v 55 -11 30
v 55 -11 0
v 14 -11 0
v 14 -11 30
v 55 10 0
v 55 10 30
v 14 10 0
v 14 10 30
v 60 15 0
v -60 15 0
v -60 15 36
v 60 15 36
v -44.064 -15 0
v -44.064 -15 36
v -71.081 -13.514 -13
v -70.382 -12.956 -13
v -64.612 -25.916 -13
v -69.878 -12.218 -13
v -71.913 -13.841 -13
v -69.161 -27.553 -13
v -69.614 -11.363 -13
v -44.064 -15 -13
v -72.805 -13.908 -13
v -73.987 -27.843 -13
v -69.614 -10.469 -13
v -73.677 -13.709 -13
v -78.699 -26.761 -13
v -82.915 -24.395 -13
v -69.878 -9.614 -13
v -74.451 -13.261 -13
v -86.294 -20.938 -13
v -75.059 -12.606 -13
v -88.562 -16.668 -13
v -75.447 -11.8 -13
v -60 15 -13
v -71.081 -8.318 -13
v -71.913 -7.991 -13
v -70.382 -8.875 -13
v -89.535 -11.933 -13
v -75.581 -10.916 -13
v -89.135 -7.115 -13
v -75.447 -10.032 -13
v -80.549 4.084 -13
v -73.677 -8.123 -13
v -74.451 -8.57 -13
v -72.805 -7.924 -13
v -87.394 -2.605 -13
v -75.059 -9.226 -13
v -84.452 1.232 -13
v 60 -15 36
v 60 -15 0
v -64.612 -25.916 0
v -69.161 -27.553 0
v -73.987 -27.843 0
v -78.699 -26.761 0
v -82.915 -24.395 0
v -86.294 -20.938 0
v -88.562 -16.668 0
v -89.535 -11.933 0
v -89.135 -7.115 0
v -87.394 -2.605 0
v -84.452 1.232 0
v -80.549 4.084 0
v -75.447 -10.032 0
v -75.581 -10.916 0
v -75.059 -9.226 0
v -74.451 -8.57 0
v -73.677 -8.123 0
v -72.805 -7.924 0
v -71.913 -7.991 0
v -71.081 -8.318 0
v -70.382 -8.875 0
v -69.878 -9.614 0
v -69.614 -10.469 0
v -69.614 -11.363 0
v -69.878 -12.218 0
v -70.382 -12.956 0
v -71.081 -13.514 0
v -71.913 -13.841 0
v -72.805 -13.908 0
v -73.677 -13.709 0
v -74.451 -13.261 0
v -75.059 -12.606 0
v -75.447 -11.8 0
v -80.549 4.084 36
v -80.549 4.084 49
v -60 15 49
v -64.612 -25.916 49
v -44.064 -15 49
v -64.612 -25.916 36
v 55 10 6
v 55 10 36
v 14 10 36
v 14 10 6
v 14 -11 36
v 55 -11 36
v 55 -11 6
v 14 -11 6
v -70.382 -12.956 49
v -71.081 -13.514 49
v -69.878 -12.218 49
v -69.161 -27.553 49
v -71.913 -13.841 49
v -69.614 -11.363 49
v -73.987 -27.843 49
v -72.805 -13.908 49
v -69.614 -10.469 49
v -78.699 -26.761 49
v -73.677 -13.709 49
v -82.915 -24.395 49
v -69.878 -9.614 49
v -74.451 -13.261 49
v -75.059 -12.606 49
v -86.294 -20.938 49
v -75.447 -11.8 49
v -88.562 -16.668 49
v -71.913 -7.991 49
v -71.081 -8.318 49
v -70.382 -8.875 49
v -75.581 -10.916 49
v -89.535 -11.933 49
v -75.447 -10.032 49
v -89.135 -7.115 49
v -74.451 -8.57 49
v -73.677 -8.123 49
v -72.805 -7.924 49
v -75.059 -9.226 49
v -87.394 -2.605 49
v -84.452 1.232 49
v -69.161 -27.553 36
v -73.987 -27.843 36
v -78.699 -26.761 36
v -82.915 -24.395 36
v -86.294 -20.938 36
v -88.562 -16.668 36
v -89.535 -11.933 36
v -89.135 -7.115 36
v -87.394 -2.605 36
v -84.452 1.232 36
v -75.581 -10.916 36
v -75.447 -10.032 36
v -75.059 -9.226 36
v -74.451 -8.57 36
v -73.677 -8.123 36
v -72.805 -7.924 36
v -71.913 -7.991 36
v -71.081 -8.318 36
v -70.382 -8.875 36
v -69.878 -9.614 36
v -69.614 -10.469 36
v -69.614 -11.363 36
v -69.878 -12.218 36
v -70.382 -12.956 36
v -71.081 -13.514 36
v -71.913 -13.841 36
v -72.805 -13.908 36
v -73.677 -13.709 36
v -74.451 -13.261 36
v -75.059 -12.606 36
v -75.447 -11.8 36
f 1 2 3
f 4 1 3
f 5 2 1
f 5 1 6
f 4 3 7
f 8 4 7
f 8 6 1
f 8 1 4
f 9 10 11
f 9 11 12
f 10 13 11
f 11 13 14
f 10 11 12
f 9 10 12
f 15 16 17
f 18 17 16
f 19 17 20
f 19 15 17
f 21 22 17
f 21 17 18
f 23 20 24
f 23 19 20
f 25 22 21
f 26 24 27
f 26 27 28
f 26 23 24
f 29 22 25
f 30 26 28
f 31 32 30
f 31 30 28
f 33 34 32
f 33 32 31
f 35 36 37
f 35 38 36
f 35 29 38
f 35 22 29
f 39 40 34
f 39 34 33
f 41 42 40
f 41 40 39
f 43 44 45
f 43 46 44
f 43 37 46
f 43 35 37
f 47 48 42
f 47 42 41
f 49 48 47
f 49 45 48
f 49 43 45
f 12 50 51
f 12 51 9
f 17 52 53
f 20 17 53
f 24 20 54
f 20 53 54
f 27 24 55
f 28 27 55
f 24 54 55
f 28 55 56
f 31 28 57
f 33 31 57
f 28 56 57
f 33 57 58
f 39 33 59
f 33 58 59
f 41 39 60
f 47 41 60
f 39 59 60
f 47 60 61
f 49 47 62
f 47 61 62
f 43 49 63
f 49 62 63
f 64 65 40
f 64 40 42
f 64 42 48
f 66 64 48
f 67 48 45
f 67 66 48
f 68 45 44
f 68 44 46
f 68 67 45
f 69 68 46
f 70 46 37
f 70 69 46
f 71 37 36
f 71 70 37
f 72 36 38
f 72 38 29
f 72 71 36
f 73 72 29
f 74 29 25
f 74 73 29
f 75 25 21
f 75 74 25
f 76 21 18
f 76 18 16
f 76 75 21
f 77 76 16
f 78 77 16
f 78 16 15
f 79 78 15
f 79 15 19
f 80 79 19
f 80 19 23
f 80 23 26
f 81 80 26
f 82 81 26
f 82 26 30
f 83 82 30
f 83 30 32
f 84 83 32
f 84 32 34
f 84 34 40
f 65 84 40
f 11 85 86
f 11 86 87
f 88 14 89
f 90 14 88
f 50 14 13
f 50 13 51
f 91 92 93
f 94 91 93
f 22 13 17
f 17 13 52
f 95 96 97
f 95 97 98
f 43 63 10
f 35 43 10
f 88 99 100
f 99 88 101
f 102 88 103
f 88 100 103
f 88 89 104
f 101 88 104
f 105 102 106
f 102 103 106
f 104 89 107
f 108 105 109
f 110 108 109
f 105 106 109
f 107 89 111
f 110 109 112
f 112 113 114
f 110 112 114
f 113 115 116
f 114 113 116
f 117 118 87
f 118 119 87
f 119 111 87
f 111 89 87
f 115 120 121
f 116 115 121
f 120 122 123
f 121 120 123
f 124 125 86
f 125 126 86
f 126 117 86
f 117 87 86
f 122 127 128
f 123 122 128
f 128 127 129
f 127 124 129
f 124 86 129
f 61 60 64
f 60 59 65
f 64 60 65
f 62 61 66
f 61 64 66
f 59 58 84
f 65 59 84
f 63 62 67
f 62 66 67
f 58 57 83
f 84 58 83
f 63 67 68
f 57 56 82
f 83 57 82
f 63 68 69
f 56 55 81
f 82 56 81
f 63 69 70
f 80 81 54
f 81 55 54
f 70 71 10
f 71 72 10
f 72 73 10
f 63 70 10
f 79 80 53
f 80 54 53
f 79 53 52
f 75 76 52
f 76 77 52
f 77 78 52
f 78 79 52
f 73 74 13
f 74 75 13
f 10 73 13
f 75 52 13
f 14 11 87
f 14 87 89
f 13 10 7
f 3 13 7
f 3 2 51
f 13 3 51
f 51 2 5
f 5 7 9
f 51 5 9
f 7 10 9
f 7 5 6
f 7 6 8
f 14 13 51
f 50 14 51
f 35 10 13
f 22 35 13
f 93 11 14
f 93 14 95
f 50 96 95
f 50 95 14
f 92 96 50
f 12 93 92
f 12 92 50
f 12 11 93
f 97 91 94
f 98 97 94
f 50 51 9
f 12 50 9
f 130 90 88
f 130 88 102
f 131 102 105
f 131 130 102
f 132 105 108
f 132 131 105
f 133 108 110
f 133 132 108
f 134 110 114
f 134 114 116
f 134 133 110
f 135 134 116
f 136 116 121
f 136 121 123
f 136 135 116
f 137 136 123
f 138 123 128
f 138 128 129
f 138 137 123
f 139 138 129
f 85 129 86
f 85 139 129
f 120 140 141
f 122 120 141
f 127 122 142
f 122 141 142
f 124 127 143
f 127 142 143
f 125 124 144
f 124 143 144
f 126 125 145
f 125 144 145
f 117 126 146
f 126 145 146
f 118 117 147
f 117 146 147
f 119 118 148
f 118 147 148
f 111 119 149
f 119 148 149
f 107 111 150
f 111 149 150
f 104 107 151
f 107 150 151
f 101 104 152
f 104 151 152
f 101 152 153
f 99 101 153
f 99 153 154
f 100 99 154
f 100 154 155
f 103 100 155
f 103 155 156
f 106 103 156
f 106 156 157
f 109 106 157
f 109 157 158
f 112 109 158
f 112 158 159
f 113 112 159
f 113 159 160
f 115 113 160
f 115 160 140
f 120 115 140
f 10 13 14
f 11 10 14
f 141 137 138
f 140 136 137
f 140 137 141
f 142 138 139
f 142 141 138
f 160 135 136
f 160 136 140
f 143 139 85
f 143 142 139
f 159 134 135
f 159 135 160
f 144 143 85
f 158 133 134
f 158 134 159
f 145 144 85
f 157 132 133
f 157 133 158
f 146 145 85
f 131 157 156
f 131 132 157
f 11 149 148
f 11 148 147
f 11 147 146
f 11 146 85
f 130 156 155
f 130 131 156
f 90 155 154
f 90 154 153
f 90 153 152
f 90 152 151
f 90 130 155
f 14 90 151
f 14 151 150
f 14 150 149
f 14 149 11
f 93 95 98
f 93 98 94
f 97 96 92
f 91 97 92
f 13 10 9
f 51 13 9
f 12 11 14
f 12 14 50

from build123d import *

# Parameters (mm, degrees)
SKETCH_1_W          = 120
SKETCH_1_H          = 30
EXTRUDE_1_DEPTH     = 36
SKETCH_2_W          = 41
SKETCH_2_H          = 21
CUT_EXTRUDE_1_DEPTH = 30
EXTRUDE_START       = -13
SKETCH_4_R          = 3
EXTRUDE_2_DEPTH     = 13
SKETCH_6_W          = 23.268382573
SKETCH_6_H          = 36
CUT_EXTRUDE_2_DEPTH = 105.8740742


with BuildPart() as part:
    # 草图1 → 凸台-拉伸1 (new body)
    with BuildSketch(Plane.XY):
        Rectangle(SKETCH_1_W, SKETCH_1_H)
    extrude(amount=EXTRUDE_1_DEPTH)

    # 草图2 → 切除-拉伸1 (cut)
    with BuildSketch(Plane(origin=(0, 0, 0), x_dir=(-1, 0, 0), z_dir=(0, 0, -1))):
        with Locations((-34.5, -0.5)):
            Rectangle(SKETCH_2_W, SKETCH_2_H)
    extrude(amount=-CUT_EXTRUDE_1_DEPTH, mode=Mode.SUBTRACT)

    # 草图4 → 凸台-拉伸2 (add)
    with BuildSketch(Plane(origin=(0, 0, -13), x_dir=(-1, 0, 0), z_dir=(0, 0, -1)).offset(EXTRUDE_START)):
        with BuildLine():
            Line((60, 15), (44.063500094, -15))
            Line((44.063500094, -15), (64.612458324, -25.91594903))
            ThreePointArc((64.612458324, -25.91594903), (87.580708277, -18.884198983), (80.54895823, 4.08405097))
            Line((80.54895823, 4.08405097), (60, 15))
        make_face()
        with Locations((72.580708277, -10.91594903)):
            Circle(SKETCH_4_R, mode=Mode.SUBTRACT)
    extrude(amount=EXTRUDE_2_DEPTH)


with BuildPart() as body_2:
    # 镜向5: mirrored copy
    add(part.part.mirror(Plane(origin=(0, 0, 18), x_dir=(1, 0, 0), z_dir=(0, 0, -1))))


with BuildPart() as cut_extrude_2_tool:
    # 草图6 → 切除-拉伸2 (new, through all)
    with BuildSketch(Plane(origin=(-3.483162049, 6.556951782, 0), x_dir=(0.8831279168378943, 0.46913226546631975, 0), z_dir=(0.4691322654663197, -0.8831279168378942, 0))):
        with Locations((-57.584882315, 18)):
            Rectangle(SKETCH_6_W, SKETCH_6_H)
    extrude(amount=-CUT_EXTRUDE_2_DEPTH)


with BuildPart() as part_1:
    add(part.part)

    # 切除-拉伸2: cut by cut_extrude_2_tool
    add(cut_extrude_2_tool.part, mode=Mode.SUBTRACT)


with BuildPart() as body_2_1:
    add(body_2.part)

    # 切除-拉伸2: cut by cut_extrude_2_tool
    add(cut_extrude_2_tool.part, mode=Mode.SUBTRACT)


with BuildPart() as cut_extrude_2_piece_1:
    # of the separate pieces the step leaves, piece 1, a body of its own (cut_extrude_2_pieces)
    add(part_1.part.solids().sort_by_distance((-60, 15, 36))[0])


with BuildPart() as cut_extrude_2_piece_2:
    # of the separate pieces the step leaves, piece 2, a body of its own (cut_extrude_2_pieces)
    add(part_1.part.solids().sort_by_distance((-64.612458324, -25.91594903, 0))[0])


with BuildPart() as cut_extrude_2_piece_1_of_body_2:
    # of the separate pieces the step leaves, piece 1, a body of its own (cut_extrude_2_pieces_of_body_2)
    add(body_2_1.part.solids().sort_by_distance((-60, 15, 0))[0])


with BuildPart() as cut_extrude_2_piece_2_of_body_2:
    # of the separate pieces the step leaves, piece 2, a body of its own (cut_extrude_2_pieces_of_body_2)
    add(body_2_1.part.solids().sort_by_distance((-64.612458324, -25.91594903, 36))[0])


solid = Compound([cut_extrude_2_piece_1.part, cut_extrude_2_piece_2.part, cut_extrude_2_piece_1_of_body_2.part, cut_extrude_2_piece_2_of_body_2.part])
